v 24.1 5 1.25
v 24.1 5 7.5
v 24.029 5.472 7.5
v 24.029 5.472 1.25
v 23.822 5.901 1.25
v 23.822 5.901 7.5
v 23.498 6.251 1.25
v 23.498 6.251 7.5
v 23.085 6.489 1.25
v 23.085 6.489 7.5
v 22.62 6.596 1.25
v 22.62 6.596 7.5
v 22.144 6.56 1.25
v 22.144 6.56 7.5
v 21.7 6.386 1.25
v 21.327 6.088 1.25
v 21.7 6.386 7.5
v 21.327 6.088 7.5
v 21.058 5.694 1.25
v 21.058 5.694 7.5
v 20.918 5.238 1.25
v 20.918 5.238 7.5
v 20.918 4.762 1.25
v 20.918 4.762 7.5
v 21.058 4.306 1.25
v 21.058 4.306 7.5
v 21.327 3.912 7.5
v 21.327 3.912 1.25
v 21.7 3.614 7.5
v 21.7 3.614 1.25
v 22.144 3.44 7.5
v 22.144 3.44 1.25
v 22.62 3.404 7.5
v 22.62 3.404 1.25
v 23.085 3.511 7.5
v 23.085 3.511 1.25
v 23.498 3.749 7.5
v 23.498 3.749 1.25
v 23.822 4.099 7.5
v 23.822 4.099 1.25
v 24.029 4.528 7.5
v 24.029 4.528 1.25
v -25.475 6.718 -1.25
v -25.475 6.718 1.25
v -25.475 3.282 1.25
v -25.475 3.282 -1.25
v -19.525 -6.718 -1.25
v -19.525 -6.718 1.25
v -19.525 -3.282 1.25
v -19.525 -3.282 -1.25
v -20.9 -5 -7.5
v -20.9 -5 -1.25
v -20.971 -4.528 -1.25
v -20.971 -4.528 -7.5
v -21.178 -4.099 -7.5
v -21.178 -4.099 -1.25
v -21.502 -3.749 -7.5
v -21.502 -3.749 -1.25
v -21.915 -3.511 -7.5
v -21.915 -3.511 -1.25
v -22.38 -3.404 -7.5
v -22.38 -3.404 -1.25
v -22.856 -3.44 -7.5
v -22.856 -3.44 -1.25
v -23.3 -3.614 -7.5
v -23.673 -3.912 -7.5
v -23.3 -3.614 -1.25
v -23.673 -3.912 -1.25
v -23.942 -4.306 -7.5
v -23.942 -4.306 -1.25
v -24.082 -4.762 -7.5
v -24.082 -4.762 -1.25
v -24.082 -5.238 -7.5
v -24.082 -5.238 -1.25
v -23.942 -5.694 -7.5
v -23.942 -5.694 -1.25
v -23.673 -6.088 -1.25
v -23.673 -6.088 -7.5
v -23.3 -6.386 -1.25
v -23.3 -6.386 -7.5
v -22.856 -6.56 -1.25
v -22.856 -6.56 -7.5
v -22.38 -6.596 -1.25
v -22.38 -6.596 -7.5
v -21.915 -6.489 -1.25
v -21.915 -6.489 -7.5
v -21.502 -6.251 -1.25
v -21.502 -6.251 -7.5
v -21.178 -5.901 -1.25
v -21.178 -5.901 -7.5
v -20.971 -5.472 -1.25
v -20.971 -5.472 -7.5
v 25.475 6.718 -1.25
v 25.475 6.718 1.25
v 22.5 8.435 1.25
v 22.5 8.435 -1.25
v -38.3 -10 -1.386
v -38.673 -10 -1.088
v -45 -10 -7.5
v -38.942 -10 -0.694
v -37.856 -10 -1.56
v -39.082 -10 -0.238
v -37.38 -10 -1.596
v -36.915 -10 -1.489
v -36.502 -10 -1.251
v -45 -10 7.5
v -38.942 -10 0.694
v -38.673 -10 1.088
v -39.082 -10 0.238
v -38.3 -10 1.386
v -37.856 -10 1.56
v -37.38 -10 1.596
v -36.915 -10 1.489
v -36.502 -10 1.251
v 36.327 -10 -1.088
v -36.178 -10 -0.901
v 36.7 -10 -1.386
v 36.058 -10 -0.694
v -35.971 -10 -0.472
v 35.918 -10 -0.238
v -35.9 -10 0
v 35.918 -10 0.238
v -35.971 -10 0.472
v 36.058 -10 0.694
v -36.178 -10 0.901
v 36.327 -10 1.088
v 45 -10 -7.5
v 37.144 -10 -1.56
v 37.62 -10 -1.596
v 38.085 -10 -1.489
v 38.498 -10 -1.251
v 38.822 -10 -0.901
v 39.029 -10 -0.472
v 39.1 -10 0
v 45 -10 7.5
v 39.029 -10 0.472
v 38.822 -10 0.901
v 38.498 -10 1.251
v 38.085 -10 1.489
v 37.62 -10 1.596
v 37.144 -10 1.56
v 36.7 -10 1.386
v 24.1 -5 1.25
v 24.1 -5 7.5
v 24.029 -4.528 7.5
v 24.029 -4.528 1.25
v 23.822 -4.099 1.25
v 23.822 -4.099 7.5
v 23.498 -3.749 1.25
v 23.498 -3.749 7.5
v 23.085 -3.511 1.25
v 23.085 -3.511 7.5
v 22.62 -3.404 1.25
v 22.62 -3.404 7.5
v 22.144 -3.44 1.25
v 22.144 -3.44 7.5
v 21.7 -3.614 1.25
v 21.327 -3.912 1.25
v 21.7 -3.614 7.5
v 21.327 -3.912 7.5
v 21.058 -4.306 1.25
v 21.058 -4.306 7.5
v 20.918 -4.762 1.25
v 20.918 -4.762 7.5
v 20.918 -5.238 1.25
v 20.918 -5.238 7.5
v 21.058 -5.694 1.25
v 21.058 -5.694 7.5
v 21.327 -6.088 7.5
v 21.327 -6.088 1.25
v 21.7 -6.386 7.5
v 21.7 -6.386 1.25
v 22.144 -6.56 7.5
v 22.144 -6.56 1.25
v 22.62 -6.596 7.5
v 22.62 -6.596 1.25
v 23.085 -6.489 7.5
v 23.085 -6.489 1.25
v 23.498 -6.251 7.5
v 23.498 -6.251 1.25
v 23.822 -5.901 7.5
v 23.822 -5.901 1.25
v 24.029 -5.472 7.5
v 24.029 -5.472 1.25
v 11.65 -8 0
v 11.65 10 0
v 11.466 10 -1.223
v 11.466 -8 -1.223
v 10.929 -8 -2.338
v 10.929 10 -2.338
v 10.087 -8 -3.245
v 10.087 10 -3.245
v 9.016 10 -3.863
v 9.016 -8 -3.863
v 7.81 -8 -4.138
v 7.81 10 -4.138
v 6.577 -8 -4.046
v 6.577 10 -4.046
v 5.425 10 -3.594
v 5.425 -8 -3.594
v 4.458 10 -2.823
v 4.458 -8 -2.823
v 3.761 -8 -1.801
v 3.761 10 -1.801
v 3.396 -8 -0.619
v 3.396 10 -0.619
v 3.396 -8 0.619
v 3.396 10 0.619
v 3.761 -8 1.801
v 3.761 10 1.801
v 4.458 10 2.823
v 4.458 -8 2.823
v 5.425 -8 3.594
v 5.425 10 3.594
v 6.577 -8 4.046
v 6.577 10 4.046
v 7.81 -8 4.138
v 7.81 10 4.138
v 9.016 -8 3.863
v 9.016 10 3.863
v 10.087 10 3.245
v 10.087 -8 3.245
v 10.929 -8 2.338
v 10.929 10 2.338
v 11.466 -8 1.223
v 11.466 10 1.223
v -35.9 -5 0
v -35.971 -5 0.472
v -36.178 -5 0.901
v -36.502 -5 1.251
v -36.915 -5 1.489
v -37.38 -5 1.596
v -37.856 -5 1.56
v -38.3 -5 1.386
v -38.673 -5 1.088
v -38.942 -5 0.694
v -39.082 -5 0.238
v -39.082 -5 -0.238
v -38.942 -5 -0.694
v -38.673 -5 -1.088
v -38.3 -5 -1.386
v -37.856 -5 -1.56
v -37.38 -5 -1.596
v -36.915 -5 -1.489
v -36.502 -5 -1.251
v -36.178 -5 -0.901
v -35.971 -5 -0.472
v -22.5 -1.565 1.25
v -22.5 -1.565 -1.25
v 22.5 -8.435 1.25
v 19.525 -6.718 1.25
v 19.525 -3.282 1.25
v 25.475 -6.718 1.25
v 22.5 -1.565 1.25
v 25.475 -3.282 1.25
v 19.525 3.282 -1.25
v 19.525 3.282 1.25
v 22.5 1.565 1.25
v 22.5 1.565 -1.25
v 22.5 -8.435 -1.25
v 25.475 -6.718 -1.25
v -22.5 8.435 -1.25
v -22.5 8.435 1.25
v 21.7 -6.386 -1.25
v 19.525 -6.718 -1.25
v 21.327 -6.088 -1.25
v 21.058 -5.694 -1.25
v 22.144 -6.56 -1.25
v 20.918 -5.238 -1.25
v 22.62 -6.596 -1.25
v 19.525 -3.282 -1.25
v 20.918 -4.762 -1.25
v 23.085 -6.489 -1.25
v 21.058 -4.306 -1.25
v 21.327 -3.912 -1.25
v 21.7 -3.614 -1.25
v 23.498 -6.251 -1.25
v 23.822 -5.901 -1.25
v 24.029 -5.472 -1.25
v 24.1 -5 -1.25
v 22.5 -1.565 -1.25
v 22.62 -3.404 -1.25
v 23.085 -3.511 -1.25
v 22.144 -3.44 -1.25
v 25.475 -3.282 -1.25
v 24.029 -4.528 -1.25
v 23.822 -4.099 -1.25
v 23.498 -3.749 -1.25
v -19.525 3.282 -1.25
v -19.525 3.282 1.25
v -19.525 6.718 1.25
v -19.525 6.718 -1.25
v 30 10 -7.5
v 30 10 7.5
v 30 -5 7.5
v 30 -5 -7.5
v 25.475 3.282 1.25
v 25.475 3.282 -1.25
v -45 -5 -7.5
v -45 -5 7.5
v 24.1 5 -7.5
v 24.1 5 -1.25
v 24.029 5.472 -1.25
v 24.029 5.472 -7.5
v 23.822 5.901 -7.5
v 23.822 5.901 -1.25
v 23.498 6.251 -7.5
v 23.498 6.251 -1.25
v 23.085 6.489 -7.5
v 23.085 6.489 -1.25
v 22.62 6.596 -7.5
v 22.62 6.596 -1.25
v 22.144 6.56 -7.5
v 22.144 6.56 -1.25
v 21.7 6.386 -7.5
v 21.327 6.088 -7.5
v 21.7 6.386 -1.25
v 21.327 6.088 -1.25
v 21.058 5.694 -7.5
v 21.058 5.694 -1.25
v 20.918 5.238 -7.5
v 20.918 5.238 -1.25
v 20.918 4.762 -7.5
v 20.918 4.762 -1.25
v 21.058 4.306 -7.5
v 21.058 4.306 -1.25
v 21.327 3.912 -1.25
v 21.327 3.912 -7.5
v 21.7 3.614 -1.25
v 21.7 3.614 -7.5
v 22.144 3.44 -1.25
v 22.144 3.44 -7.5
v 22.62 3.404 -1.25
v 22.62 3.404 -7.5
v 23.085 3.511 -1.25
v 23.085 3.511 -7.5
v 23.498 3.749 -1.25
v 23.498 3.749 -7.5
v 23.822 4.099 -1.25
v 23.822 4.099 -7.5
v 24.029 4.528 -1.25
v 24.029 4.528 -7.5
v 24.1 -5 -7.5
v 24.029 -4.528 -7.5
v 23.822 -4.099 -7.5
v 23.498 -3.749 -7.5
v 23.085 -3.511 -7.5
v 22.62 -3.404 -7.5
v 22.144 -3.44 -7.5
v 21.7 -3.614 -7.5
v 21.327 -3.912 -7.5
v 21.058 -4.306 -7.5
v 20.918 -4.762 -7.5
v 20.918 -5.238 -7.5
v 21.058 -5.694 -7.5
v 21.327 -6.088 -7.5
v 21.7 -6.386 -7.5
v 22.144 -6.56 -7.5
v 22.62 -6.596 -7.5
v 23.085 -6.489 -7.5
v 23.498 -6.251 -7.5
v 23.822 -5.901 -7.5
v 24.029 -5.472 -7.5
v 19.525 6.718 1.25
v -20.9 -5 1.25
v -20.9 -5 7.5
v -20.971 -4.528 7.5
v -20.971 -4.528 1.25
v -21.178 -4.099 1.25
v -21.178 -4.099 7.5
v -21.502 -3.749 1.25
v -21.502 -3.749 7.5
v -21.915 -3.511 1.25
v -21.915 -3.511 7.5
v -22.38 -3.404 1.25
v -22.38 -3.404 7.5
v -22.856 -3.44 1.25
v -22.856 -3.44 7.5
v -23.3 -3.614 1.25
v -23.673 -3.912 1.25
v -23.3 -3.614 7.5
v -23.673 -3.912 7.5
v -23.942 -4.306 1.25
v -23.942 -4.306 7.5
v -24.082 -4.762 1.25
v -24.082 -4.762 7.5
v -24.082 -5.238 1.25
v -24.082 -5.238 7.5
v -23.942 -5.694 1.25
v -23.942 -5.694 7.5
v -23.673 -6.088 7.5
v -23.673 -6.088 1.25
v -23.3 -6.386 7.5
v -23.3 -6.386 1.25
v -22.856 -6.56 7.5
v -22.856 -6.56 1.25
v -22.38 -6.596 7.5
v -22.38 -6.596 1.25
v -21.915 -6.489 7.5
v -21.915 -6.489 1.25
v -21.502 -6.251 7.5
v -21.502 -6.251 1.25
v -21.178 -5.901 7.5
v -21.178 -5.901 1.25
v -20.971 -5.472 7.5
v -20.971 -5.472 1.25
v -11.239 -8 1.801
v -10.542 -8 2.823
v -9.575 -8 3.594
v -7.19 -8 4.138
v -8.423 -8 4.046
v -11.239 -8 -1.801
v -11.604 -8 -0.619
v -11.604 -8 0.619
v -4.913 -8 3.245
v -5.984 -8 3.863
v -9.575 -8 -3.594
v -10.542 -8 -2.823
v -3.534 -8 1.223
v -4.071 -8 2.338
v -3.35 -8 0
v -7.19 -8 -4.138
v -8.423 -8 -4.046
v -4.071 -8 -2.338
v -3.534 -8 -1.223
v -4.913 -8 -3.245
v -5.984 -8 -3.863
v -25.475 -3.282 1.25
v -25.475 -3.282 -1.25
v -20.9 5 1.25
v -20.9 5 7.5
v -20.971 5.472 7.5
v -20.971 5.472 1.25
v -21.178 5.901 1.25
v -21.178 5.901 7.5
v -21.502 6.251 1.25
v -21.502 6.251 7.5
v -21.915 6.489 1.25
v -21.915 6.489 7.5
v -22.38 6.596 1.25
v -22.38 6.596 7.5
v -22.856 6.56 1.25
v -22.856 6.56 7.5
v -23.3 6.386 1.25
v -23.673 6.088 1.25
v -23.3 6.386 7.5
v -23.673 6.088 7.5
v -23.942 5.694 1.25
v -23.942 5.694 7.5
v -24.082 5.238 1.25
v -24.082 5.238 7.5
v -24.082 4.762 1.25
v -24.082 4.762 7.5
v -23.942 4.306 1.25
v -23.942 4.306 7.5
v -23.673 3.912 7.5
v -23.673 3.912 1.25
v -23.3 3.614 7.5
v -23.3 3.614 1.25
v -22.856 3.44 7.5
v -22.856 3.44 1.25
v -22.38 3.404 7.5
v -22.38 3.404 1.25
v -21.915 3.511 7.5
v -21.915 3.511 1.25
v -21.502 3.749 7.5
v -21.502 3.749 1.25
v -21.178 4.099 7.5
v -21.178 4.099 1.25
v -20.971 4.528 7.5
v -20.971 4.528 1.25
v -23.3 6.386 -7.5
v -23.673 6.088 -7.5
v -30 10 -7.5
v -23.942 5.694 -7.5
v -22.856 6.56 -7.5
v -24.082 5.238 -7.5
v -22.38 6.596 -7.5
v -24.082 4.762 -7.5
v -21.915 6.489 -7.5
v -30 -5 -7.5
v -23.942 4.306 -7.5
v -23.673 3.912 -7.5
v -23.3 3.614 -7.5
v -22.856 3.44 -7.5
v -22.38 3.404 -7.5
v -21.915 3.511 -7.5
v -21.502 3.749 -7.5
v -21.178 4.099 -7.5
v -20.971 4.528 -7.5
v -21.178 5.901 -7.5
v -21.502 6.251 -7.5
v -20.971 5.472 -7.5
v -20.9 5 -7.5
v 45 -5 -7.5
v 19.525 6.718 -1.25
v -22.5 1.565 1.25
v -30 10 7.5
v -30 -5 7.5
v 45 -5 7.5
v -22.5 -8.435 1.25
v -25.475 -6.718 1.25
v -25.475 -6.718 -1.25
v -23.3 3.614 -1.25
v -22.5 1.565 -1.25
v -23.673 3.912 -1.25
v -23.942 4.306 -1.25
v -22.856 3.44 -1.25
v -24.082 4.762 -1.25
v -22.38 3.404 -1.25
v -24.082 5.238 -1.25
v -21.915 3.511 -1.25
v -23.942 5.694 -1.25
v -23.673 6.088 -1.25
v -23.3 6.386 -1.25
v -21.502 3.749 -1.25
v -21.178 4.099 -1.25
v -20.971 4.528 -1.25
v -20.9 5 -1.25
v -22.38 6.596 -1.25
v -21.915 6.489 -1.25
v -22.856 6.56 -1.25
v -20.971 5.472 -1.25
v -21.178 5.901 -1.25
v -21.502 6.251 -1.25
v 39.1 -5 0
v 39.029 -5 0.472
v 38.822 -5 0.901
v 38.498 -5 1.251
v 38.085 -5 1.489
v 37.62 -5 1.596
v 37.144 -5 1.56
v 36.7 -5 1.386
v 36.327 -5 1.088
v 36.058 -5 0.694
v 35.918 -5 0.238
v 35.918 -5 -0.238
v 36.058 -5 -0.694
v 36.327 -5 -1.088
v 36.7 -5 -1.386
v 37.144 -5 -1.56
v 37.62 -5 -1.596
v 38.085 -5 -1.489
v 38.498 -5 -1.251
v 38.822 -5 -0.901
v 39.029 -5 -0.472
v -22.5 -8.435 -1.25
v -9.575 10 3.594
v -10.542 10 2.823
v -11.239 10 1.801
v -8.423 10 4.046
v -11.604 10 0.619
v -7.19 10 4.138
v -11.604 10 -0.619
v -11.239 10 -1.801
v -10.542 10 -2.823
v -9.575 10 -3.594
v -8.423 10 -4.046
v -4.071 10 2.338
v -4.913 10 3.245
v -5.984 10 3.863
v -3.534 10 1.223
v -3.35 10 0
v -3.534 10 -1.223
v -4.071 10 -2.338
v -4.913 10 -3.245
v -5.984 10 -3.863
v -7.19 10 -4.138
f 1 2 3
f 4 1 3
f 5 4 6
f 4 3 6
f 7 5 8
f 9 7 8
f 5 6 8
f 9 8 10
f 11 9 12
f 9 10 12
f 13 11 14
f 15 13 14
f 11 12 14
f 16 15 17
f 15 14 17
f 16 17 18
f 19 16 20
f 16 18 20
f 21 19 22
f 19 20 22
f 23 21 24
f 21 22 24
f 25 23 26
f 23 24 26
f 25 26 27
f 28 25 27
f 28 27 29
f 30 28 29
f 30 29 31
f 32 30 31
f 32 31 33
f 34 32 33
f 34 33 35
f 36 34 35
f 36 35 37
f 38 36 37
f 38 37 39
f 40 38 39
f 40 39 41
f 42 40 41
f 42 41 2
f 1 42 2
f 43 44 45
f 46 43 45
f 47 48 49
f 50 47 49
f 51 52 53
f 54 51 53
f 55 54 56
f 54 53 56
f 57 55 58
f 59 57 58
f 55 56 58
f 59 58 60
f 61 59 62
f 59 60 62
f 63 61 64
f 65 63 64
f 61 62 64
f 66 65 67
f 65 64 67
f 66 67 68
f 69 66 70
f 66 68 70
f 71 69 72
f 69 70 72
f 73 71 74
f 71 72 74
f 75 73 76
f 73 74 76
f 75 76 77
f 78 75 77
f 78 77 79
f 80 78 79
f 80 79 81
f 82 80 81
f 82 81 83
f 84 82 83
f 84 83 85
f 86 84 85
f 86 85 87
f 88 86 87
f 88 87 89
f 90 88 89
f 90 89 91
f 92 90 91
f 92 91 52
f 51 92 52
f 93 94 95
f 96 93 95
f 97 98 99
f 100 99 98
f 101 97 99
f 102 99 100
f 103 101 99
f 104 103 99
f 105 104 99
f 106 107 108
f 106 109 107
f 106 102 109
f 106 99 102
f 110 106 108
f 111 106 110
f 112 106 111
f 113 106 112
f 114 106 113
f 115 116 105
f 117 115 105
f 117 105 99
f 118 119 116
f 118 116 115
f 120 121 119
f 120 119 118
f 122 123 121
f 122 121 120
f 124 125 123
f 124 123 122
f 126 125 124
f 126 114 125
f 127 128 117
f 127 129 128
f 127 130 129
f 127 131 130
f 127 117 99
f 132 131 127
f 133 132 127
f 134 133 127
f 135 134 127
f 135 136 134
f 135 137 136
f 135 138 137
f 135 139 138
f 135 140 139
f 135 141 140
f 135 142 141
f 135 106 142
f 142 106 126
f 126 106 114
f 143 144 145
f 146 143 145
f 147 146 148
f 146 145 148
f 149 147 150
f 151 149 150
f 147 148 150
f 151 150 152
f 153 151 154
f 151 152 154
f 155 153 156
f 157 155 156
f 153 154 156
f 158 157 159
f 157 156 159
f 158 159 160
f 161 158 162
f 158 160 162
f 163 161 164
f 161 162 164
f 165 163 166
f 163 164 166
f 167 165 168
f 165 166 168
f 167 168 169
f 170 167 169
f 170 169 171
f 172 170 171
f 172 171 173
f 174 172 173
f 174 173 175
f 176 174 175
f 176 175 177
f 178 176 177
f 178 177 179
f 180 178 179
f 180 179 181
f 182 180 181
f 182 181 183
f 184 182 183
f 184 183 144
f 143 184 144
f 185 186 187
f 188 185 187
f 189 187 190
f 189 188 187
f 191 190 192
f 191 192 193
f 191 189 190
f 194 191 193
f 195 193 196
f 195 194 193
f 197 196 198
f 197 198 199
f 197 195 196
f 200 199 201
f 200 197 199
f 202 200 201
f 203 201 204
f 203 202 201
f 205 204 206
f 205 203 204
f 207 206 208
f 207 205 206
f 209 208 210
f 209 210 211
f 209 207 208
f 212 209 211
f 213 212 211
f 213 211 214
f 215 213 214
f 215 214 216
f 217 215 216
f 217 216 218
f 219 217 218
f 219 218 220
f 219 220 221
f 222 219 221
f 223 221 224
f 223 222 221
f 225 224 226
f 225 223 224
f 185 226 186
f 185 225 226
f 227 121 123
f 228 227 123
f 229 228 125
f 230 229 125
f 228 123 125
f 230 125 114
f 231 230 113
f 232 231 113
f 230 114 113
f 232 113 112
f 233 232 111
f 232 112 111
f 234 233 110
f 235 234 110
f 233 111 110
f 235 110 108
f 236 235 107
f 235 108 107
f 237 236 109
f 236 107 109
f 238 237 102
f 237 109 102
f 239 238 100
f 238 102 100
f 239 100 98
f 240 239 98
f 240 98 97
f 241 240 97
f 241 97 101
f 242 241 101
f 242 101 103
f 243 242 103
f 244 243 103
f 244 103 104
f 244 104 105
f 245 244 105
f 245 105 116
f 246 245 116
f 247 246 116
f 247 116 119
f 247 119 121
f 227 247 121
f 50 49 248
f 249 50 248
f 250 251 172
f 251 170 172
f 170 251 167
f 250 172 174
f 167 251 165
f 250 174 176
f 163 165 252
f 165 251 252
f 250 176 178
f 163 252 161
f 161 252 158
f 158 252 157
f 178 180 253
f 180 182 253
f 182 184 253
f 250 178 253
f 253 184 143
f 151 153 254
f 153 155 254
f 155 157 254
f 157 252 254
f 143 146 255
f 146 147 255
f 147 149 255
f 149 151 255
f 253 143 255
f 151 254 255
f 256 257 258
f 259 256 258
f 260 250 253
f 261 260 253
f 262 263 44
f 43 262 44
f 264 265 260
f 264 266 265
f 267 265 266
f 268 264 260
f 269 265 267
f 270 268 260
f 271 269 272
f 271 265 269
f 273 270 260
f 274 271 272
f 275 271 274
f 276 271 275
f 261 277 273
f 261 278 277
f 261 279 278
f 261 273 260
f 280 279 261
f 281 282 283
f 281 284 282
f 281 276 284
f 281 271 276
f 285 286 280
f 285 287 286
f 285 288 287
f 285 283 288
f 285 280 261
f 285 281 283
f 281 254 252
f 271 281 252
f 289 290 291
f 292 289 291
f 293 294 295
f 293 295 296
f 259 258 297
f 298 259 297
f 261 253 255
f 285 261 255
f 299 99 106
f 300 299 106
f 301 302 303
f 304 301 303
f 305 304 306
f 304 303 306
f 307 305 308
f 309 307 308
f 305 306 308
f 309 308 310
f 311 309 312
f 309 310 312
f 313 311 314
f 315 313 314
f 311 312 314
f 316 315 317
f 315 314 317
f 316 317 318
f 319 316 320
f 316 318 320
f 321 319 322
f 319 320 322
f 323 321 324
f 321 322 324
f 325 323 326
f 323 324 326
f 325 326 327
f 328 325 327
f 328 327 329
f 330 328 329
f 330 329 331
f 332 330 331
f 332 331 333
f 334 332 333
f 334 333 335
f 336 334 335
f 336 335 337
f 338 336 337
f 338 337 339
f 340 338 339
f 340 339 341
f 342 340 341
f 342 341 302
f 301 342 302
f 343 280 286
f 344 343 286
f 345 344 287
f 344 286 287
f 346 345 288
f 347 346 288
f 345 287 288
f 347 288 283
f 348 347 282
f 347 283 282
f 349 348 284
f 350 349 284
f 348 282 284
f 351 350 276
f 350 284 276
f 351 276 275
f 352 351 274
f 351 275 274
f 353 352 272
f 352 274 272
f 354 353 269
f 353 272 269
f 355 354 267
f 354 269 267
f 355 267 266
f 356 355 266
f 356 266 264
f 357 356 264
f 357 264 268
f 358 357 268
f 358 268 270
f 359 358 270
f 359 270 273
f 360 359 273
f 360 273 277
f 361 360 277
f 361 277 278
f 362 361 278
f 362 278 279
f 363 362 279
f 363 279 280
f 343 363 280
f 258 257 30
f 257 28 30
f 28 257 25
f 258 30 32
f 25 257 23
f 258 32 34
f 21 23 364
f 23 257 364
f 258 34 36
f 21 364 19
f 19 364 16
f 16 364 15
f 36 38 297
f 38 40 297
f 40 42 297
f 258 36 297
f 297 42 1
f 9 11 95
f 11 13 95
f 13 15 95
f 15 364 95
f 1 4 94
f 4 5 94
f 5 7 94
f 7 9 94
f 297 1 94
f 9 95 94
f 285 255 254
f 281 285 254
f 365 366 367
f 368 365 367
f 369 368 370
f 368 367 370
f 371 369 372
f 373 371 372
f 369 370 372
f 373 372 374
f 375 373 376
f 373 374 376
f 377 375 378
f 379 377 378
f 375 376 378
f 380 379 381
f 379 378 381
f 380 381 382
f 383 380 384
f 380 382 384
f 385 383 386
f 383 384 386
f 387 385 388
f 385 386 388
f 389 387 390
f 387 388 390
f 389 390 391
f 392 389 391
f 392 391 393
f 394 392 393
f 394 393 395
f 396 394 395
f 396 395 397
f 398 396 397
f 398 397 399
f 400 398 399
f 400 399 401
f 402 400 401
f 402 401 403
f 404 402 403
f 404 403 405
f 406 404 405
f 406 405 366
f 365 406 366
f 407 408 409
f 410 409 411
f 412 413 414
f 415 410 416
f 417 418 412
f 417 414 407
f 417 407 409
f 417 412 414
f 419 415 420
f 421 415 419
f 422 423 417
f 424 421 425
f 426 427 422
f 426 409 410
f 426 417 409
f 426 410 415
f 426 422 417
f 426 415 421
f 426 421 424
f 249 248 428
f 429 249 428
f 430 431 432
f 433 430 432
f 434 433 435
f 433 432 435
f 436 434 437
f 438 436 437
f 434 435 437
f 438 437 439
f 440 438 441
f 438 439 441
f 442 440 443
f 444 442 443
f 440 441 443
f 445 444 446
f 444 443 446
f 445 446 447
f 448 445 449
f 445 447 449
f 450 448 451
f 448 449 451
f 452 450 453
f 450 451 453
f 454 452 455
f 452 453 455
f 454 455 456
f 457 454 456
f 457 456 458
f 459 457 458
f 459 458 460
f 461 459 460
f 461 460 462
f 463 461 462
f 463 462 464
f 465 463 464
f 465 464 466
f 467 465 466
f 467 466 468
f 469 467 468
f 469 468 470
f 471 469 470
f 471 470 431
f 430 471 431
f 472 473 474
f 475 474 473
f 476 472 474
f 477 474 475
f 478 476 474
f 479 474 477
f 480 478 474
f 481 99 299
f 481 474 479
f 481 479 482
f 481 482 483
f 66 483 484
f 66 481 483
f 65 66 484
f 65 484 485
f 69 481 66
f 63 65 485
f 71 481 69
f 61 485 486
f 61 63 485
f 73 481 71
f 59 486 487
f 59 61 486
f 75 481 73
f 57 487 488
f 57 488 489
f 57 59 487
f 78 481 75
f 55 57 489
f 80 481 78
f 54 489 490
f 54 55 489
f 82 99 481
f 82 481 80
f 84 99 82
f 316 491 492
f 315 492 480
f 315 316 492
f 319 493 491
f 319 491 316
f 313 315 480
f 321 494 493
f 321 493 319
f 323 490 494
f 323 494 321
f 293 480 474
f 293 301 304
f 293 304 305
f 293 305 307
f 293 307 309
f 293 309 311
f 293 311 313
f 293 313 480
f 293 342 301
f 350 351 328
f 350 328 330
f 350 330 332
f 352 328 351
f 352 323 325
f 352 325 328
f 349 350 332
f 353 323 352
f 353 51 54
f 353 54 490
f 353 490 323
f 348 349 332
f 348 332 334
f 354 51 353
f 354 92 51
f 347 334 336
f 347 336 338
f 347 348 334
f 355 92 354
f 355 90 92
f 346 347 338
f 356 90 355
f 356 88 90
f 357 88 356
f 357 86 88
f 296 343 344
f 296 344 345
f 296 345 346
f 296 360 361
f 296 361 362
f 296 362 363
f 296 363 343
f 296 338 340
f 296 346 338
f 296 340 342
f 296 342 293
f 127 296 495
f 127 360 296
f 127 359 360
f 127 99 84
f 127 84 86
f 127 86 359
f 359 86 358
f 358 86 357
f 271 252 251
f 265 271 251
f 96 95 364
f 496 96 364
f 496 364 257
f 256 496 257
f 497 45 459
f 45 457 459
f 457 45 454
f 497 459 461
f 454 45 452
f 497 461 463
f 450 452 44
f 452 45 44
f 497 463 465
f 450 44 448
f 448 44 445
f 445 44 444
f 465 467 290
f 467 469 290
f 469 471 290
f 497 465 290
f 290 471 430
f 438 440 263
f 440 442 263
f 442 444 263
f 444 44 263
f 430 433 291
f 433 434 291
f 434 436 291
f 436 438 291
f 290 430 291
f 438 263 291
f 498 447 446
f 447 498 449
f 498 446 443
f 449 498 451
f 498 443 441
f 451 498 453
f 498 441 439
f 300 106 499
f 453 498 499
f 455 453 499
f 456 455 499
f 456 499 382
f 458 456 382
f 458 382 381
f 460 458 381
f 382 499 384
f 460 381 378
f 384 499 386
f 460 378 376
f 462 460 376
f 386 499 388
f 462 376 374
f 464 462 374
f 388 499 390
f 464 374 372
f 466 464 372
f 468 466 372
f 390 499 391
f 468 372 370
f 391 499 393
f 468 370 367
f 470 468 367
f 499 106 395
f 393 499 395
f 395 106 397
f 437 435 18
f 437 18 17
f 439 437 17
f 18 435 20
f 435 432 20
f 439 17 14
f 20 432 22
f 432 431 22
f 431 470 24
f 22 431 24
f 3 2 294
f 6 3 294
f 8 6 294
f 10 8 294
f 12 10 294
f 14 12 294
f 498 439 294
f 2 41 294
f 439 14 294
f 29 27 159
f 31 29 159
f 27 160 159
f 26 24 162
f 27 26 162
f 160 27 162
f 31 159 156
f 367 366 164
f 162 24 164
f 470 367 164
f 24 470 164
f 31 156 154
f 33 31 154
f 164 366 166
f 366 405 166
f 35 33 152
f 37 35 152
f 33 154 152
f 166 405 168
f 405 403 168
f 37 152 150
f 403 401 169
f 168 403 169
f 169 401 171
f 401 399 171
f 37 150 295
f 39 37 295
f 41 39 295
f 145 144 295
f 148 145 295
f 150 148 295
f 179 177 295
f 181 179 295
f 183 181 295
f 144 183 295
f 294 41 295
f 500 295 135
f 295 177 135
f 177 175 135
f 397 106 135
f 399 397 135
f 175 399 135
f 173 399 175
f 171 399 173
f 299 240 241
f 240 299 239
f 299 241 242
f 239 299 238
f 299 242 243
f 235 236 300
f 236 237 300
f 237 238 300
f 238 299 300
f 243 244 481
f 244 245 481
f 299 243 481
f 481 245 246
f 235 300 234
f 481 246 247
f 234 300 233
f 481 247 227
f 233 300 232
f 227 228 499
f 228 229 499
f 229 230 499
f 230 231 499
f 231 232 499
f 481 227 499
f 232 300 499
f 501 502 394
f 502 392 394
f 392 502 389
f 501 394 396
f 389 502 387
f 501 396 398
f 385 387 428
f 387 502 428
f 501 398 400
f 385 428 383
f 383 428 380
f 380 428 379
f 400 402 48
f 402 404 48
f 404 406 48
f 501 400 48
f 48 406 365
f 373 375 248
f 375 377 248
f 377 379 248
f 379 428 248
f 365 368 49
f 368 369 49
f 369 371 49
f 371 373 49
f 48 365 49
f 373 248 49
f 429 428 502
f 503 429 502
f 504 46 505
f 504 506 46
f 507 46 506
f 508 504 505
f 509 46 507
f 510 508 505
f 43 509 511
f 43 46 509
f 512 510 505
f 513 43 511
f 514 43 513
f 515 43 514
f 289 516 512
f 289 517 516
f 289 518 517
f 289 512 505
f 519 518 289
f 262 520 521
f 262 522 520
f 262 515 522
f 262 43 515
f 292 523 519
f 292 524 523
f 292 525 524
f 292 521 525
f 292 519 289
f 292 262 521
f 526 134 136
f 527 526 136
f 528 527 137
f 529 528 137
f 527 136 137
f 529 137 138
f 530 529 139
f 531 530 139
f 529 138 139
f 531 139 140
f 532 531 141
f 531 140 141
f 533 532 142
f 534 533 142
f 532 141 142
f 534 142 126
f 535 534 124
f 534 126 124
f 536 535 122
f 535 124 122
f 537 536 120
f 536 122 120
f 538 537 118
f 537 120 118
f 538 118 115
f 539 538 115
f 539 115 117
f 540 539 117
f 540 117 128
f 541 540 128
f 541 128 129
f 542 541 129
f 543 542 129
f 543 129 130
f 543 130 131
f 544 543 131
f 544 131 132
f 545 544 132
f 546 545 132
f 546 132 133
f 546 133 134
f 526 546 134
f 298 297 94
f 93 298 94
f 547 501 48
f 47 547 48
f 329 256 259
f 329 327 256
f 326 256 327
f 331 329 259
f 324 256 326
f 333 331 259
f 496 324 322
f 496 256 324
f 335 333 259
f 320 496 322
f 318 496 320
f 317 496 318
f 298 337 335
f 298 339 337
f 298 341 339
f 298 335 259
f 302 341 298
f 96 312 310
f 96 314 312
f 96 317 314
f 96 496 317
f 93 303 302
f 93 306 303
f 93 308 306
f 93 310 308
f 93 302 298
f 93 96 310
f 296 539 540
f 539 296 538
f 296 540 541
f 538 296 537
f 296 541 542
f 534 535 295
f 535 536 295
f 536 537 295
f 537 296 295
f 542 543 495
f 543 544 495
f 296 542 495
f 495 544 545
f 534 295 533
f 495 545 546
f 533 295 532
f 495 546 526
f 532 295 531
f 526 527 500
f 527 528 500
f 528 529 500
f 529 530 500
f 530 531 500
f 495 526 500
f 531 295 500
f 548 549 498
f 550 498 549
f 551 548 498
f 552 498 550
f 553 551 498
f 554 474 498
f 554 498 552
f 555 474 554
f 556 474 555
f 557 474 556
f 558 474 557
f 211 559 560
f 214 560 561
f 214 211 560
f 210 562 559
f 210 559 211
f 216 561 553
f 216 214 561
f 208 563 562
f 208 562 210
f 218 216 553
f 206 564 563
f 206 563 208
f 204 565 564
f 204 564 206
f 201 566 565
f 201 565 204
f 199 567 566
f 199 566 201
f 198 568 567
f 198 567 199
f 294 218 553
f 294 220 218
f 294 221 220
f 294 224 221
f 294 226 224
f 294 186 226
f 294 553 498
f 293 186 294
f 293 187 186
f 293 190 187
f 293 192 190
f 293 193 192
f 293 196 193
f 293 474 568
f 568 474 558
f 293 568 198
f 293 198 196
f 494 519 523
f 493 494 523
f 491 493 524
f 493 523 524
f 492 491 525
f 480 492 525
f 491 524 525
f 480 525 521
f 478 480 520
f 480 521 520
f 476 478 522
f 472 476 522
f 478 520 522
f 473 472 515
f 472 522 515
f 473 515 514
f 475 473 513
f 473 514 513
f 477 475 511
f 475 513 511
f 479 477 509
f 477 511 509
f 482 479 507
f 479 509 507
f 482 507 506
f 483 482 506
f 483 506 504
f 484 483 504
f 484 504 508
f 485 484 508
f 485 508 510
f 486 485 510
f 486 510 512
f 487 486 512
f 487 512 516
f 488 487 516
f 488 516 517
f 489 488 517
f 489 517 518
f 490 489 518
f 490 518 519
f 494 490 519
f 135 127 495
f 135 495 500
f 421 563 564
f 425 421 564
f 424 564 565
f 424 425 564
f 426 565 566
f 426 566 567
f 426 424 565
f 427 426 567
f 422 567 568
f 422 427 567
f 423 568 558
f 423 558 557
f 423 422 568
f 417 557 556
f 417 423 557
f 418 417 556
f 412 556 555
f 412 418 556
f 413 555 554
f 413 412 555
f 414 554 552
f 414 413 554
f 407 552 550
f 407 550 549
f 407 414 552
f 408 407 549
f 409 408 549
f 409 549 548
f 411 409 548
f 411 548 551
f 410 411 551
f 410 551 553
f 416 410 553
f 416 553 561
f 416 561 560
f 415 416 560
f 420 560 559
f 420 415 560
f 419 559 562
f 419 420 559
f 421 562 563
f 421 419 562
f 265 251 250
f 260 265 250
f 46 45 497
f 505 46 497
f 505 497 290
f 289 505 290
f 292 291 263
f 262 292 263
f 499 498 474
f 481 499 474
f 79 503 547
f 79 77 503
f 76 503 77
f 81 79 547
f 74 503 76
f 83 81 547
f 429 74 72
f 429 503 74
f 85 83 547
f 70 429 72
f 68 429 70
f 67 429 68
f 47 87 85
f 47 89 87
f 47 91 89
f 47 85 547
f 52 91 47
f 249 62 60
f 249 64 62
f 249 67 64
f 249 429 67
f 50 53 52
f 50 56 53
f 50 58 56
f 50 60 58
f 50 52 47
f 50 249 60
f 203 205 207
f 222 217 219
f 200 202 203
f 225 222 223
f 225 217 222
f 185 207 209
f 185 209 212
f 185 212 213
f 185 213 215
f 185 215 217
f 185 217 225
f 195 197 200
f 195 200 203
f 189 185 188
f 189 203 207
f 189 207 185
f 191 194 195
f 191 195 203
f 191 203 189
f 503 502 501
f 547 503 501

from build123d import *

# Parameters (mm, degrees)
SKETCH2_W           = 60
SKETCH2_H           = 15
SKETCH2_R           = 4.15
BOSS_EXTRUDE1_DEPTH = 10
SKETCH2_3_W         = 60
SKETCH2_3_H         = 15
BOSS_EXTRUDE2_DEPTH = 10
SKETCH4_R           = 1.6
CUT_EXTRUDE1_DEPTH  = 36
CUT_EXTRUDE2_START  = -6.25
SKETCH4_3_R         = 1.6
CUT_EXTRUDE2_DEPTH  = 2.5
SKETCH5_W           = 15
SKETCH5_H           = 15
BOSS_EXTRUDE3_DEPTH = 5
CUT_EXTRUDE3_REACH  = 51.812
SKETCH6_R           = 1.6
CUT_EXTRUDE4_START  = -8
SKETCH7_R           = 4.15
CUT_EXTRUDE4_DEPTH  = 8


with BuildPart() as part:
    # Sketch2 → Boss-Extrude1 (new body)
    with BuildSketch(Plane(origin=(0, 0, 0), x_dir=(1, 0, 0), z_dir=(0, 1, 0))):
        Rectangle(SKETCH2_W, SKETCH2_H)
        with Locations((-7.5, 0)):
            Circle(SKETCH2_R, mode=Mode.SUBTRACT)
        with Locations((7.5, 0)):
            Circle(SKETCH2_R, mode=Mode.SUBTRACT)
    extrude(amount=BOSS_EXTRUDE1_DEPTH)

    # Sketch2<3> → Boss-Extrude2 (add)
    with BuildSketch(Plane(origin=(0, 0, 0), x_dir=(1, 0, 0), z_dir=(0, 1, 0))):
        Rectangle(SKETCH2_3_W, SKETCH2_3_H)
    extrude(amount=-BOSS_EXTRUDE2_DEPTH)

    # Sketch4 → Cut-Extrude1 (cut, through all)
    with BuildSketch(Plane.XY.offset(7.5)):
        with Locations((22.5, 5)):
            Circle(SKETCH4_R)
        with Locations((22.5, -5)):
            Circle(SKETCH4_R)
        with Locations((-22.5, -5)):
            Circle(SKETCH4_R)
        with Locations((-22.5, 5)):
            Circle(SKETCH4_R)
    extrude(amount=-CUT_EXTRUDE1_DEPTH, mode=Mode.SUBTRACT)

    # Sketch4<3> → Cut-Extrude2 (cut)
    # profile 1 of 4: a face of its own
    with BuildSketch(Plane.XY.offset(7.5).offset(CUT_EXTRUDE2_START)):
        Polygon((-22.5, 8.435234102), (-25.475, 6.717617051), (-25.475, 3.282382949), (-22.5, 1.564765898), (-19.525, 3.282382949), (-19.525, 6.717617051), align=None)
        with Locations((-22.5, 5)):
            Circle(SKETCH4_3_R, mode=Mode.SUBTRACT)
    # profile 2 of 4: a face of its own
    with BuildSketch(Plane.XY.offset(7.5).offset(CUT_EXTRUDE2_START)):
        Polygon((22.5, 8.435234102), (19.525, 6.717617051), (19.525, 3.282382949), (22.5, 1.564765898), (25.475, 3.282382949), (25.475, 6.717617051), align=None)
        with Locations((22.5, 5)):
            Circle(SKETCH4_3_R, mode=Mode.SUBTRACT)
    # profile 3 of 4: a face of its own
    with BuildSketch(Plane.XY.offset(7.5).offset(CUT_EXTRUDE2_START)):
        Polygon((-22.5, -8.435234102), (-19.525, -6.717617051), (-19.525, -3.282382949), (-22.5, -1.564765898), (-25.475, -3.282382949), (-25.475, -6.717617051), align=None)
        with Locations((-22.5, -5)):
            Circle(SKETCH4_3_R, mode=Mode.SUBTRACT)
    # profile 4 of 4: a face of its own
    with BuildSketch(Plane.XY.offset(7.5).offset(CUT_EXTRUDE2_START)):
        Polygon((22.5, -8.435234102), (25.475, -6.717617051), (25.475, -3.282382949), (22.5, -1.564765898), (19.525, -3.282382949), (19.525, -6.717617051), align=None)
        with Locations((22.5, -5)):
            Circle(SKETCH4_3_R, mode=Mode.SUBTRACT)
    extrude(amount=-CUT_EXTRUDE2_DEPTH, mode=Mode.SUBTRACT)

    # Sketch5 → Boss-Extrude3 (add)
    with BuildSketch(Plane.XZ.offset(10)):
        with Locations((-37.5, 0)):
            Rectangle(SKETCH5_W, SKETCH5_H)
        with Locations((37.5, 0)):
            Rectangle(SKETCH5_W, SKETCH5_H)
    extrude(amount=-BOSS_EXTRUDE3_DEPTH)

    # Sketch6 → Cut-Extrude3 (cut, up to next)
    with BuildSketch(Plane.XZ.offset(10), mode=Mode.PRIVATE) as cut_extrude3_sk1:
        with Locations((-37.5, 0)):
            Circle(SKETCH6_R)
    cut_extrude3_tool1 = extrude(cut_extrude3_sk1.sketch, amount=-CUT_EXTRUDE3_REACH, mode=Mode.PRIVATE) & part.part
    # Sketch6 → Cut-Extrude3 (cut, up to next)
    with BuildSketch(Plane.XZ.offset(10), mode=Mode.PRIVATE) as cut_extrude3_sk2:
        with Locations((37.5, 0)):
            Circle(SKETCH6_R)
    cut_extrude3_tool2 = extrude(cut_extrude3_sk2.sketch, amount=-CUT_EXTRUDE3_REACH, mode=Mode.PRIVATE) & part.part
    add(cut_extrude3_tool1.solids().sort_by_distance((-37.5, -10, 0))[0], mode=Mode.SUBTRACT)
    add(cut_extrude3_tool2.solids().sort_by_distance((37.5, -10, 0))[0], mode=Mode.SUBTRACT)

    # Sketch7 → Cut-Extrude4 (cut)
    with BuildSketch(Plane(origin=(0, 0, 0), x_dir=(1, 0, 0), z_dir=(0, 1, 0)).offset(CUT_EXTRUDE4_START)):
        with Locations((-7.5, 0)):
            Circle(SKETCH7_R)
        with Locations((7.5, 0)):
            Circle(SKETCH7_R)
    extrude(amount=CUT_EXTRUDE4_DEPTH, mode=Mode.SUBTRACT)


solid = part.part
